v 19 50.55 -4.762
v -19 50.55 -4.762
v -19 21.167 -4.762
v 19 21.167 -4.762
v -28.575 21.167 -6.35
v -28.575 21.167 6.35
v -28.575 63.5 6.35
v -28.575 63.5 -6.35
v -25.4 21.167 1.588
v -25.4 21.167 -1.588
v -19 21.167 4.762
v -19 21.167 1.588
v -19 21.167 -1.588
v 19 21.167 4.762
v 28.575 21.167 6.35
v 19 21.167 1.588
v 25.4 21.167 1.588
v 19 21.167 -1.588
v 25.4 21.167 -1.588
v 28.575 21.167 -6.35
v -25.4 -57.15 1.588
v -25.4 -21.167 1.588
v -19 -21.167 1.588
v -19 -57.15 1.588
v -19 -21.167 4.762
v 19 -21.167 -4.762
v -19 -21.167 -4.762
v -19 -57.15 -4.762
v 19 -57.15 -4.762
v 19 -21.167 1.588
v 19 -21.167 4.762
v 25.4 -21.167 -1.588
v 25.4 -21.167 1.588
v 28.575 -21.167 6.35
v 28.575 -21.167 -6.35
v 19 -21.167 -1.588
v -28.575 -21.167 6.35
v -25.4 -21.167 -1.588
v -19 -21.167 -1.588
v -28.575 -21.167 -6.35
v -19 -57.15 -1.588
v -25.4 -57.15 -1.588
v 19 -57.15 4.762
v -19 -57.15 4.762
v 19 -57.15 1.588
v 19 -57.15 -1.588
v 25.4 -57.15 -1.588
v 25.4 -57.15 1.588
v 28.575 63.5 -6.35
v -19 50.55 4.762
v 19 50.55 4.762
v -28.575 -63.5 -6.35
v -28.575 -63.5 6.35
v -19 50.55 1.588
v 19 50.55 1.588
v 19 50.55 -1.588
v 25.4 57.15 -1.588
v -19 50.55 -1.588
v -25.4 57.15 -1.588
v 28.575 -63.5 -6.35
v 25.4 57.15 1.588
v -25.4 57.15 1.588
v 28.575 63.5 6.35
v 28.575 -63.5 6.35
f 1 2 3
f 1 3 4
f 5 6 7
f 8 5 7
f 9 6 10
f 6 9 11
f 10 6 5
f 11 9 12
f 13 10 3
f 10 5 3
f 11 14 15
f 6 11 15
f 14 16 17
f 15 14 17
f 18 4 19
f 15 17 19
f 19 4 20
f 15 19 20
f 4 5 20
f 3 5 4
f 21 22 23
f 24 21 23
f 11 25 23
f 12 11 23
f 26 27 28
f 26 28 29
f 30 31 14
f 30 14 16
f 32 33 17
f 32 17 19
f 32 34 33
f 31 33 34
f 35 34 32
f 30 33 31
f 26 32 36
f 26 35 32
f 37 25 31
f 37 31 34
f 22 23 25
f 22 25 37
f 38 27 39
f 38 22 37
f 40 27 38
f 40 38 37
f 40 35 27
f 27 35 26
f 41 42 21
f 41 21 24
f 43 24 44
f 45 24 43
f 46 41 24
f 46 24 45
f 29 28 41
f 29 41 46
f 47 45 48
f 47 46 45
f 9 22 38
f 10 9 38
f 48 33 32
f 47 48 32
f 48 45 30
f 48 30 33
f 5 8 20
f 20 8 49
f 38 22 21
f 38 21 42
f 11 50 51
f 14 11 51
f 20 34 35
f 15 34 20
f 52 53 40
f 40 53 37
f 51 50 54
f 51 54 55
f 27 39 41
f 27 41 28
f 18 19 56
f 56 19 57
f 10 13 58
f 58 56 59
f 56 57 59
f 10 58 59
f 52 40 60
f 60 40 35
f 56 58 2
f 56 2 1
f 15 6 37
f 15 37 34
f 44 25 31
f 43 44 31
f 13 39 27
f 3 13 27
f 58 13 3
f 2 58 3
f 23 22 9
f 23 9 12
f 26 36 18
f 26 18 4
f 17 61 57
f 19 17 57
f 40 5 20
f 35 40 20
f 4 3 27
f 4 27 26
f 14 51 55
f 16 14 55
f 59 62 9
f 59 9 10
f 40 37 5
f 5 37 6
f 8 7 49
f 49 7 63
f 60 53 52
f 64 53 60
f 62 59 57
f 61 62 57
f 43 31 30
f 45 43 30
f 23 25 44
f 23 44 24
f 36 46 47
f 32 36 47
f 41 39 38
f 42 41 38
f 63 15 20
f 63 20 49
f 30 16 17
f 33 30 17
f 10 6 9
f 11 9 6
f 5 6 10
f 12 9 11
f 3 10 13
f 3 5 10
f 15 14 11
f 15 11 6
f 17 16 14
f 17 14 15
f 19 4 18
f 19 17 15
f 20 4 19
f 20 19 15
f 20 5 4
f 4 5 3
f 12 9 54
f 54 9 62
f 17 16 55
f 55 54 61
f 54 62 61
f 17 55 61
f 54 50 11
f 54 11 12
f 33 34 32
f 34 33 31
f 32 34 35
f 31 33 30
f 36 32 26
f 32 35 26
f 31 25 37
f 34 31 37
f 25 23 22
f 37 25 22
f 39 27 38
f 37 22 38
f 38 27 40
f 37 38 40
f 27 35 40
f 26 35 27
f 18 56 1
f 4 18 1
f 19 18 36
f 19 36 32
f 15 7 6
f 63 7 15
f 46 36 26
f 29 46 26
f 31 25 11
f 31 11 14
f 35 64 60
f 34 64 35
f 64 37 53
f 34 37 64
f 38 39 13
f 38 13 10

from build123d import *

# Parameters (mm, degrees)
SKETCH1_W                = 57.15
SKETCH1_H                = 127
BOSS_EXTRUDE1_DEPTH      = 6.35
SKETCH2_W                = 6.400000027
SKETCH2_H                = 3.175
SKETCH2_W_2              = 37.999999946
CUT_EXTRUDE1_DEPTH       = 57.15
SPLIT1_SURFACE_1_1_BACK  = 140.844
SPLIT1_SURFACE_1_1_DEPTH = 281.688
SPLIT1_SURFACE_1_2_BACK  = 140.844
SPLIT1_SURFACE_1_2_DEPTH = 281.688
SPLIT1_SURFACE_2_3_BACK  = 140.844
SPLIT1_SURFACE_2_3_DEPTH = 281.688
SPLIT1_SURFACE_2_4_BACK  = 140.844
SPLIT1_SURFACE_2_4_DEPTH = 281.688
SKETCH4_W                = 37.999999946
SKETCH4_H                = 3.175
BOSS_EXTRUDE2_DEPTH      = 6.600000008


with BuildPart() as part:
    # Sketch1 → Boss-Extrude1 (new, symmetric)
    with BuildSketch(Plane.XY):
        Rectangle(SKETCH1_W, SKETCH1_H)
    extrude(amount=BOSS_EXTRUDE1_DEPTH, both=True)

    # Sketch2 → Cut-Extrude1 (cut, symmetric)
    with BuildSketch(Plane(origin=(0, 0, 0), x_dir=(1, 0, 0), z_dir=(0, 1, 0))):
        with Locations((-22.199999987, 0)):
            Rectangle(SKETCH2_W, SKETCH2_H)
        Rectangle(SKETCH2_W_2, SKETCH2_H)
        with Locations((0, 3.175)):
            Rectangle(SKETCH2_W_2, SKETCH2_H)
        with Locations((0, -3.175)):
            Rectangle(SKETCH2_W_2, SKETCH2_H)
        with Locations((22.199999987, 0)):
            Rectangle(SKETCH2_W, SKETCH2_H)
    extrude(amount=CUT_EXTRUDE1_DEPTH, both=True, mode=Mode.SUBTRACT)


with BuildPart() as body_2:
    # Split1: the piece behind the surface
    add(part.part)
    # Split1 surface 1: a surface, the sketch's curves swept straight by 281.688 mm
    with BuildLine(Plane.XY.offset(6.35).offset(-SPLIT1_SURFACE_1_1_BACK), mode=Mode.PRIVATE) as split1_surface_1_1_path:
        Line((-28.575, 21.166666667), (28.575, 21.166666667))
    split1_surface_1_1 = Shell.extrude(split1_surface_1_1_path.wire(), (0 * SPLIT1_SURFACE_1_1_DEPTH, 0 * SPLIT1_SURFACE_1_1_DEPTH, 1 * SPLIT1_SURFACE_1_1_DEPTH))
    split(bisect_by=split1_surface_1_1, keep=Keep.BOTTOM)


with BuildPart() as part_1:
    add(part.part)

    # Split1: split by a surface, the side it looks to stays
    # Split1 surface 1: a surface, the sketch's curves swept straight by 281.688 mm
    with BuildLine(Plane.XY.offset(6.35).offset(-SPLIT1_SURFACE_1_2_BACK), mode=Mode.PRIVATE) as split1_surface_1_2_path:
        Line((-28.575, 21.166666667), (28.575, 21.166666667))
    split1_surface_1_2 = Shell.extrude(split1_surface_1_2_path.wire(), (0 * SPLIT1_SURFACE_1_2_DEPTH, 0 * SPLIT1_SURFACE_1_2_DEPTH, 1 * SPLIT1_SURFACE_1_2_DEPTH))
    split(bisect_by=split1_surface_1_2, keep=Keep.TOP)

    # Sketch4 → Boss-Extrude2 (add)
    with BuildSketch(Plane.XZ.offset(-57.15)):
        with Locations((0, 3.175)):
            Rectangle(SKETCH4_W, SKETCH4_H)
        with Locations((0, -3.175)):
            Rectangle(SKETCH4_W, SKETCH4_H)
    extrude(amount=BOSS_EXTRUDE2_DEPTH)


with BuildPart() as body_3:
    # Split1 2 body 2: the piece behind the surface
    add(body_2.part)
    # Split1 surface 2: a surface, the sketch's curves swept straight by 281.688 mm
    with BuildLine(Plane.XY.offset(6.35).offset(-SPLIT1_SURFACE_2_3_BACK), mode=Mode.PRIVATE) as split1_surface_2_3_path:
        Line((28.575, -21.166666667), (-28.575, -21.166666667))
    split1_surface_2_3 = Shell.extrude(split1_surface_2_3_path.wire(), (0 * SPLIT1_SURFACE_2_3_DEPTH, 0 * SPLIT1_SURFACE_2_3_DEPTH, 1 * SPLIT1_SURFACE_2_3_DEPTH))
    split(bisect_by=split1_surface_2_3, keep=Keep.BOTTOM)


with BuildPart() as body_2_1:
    add(body_2.part)

    # Split1 2 body 2: split by a surface, the side it looks to stays
    # Split1 surface 2: a surface, the sketch's curves swept straight by 281.688 mm
    with BuildLine(Plane.XY.offset(6.35).offset(-SPLIT1_SURFACE_2_4_BACK), mode=Mode.PRIVATE) as split1_surface_2_4_path:
        Line((28.575, -21.166666667), (-28.575, -21.166666667))
    split1_surface_2_4 = Shell.extrude(split1_surface_2_4_path.wire(), (0 * SPLIT1_SURFACE_2_4_DEPTH, 0 * SPLIT1_SURFACE_2_4_DEPTH, 1 * SPLIT1_SURFACE_2_4_DEPTH))
    split(bisect_by=split1_surface_2_4, keep=Keep.TOP)


solid = Compound([part_1.part, body_3.part, body_2_1.part])
